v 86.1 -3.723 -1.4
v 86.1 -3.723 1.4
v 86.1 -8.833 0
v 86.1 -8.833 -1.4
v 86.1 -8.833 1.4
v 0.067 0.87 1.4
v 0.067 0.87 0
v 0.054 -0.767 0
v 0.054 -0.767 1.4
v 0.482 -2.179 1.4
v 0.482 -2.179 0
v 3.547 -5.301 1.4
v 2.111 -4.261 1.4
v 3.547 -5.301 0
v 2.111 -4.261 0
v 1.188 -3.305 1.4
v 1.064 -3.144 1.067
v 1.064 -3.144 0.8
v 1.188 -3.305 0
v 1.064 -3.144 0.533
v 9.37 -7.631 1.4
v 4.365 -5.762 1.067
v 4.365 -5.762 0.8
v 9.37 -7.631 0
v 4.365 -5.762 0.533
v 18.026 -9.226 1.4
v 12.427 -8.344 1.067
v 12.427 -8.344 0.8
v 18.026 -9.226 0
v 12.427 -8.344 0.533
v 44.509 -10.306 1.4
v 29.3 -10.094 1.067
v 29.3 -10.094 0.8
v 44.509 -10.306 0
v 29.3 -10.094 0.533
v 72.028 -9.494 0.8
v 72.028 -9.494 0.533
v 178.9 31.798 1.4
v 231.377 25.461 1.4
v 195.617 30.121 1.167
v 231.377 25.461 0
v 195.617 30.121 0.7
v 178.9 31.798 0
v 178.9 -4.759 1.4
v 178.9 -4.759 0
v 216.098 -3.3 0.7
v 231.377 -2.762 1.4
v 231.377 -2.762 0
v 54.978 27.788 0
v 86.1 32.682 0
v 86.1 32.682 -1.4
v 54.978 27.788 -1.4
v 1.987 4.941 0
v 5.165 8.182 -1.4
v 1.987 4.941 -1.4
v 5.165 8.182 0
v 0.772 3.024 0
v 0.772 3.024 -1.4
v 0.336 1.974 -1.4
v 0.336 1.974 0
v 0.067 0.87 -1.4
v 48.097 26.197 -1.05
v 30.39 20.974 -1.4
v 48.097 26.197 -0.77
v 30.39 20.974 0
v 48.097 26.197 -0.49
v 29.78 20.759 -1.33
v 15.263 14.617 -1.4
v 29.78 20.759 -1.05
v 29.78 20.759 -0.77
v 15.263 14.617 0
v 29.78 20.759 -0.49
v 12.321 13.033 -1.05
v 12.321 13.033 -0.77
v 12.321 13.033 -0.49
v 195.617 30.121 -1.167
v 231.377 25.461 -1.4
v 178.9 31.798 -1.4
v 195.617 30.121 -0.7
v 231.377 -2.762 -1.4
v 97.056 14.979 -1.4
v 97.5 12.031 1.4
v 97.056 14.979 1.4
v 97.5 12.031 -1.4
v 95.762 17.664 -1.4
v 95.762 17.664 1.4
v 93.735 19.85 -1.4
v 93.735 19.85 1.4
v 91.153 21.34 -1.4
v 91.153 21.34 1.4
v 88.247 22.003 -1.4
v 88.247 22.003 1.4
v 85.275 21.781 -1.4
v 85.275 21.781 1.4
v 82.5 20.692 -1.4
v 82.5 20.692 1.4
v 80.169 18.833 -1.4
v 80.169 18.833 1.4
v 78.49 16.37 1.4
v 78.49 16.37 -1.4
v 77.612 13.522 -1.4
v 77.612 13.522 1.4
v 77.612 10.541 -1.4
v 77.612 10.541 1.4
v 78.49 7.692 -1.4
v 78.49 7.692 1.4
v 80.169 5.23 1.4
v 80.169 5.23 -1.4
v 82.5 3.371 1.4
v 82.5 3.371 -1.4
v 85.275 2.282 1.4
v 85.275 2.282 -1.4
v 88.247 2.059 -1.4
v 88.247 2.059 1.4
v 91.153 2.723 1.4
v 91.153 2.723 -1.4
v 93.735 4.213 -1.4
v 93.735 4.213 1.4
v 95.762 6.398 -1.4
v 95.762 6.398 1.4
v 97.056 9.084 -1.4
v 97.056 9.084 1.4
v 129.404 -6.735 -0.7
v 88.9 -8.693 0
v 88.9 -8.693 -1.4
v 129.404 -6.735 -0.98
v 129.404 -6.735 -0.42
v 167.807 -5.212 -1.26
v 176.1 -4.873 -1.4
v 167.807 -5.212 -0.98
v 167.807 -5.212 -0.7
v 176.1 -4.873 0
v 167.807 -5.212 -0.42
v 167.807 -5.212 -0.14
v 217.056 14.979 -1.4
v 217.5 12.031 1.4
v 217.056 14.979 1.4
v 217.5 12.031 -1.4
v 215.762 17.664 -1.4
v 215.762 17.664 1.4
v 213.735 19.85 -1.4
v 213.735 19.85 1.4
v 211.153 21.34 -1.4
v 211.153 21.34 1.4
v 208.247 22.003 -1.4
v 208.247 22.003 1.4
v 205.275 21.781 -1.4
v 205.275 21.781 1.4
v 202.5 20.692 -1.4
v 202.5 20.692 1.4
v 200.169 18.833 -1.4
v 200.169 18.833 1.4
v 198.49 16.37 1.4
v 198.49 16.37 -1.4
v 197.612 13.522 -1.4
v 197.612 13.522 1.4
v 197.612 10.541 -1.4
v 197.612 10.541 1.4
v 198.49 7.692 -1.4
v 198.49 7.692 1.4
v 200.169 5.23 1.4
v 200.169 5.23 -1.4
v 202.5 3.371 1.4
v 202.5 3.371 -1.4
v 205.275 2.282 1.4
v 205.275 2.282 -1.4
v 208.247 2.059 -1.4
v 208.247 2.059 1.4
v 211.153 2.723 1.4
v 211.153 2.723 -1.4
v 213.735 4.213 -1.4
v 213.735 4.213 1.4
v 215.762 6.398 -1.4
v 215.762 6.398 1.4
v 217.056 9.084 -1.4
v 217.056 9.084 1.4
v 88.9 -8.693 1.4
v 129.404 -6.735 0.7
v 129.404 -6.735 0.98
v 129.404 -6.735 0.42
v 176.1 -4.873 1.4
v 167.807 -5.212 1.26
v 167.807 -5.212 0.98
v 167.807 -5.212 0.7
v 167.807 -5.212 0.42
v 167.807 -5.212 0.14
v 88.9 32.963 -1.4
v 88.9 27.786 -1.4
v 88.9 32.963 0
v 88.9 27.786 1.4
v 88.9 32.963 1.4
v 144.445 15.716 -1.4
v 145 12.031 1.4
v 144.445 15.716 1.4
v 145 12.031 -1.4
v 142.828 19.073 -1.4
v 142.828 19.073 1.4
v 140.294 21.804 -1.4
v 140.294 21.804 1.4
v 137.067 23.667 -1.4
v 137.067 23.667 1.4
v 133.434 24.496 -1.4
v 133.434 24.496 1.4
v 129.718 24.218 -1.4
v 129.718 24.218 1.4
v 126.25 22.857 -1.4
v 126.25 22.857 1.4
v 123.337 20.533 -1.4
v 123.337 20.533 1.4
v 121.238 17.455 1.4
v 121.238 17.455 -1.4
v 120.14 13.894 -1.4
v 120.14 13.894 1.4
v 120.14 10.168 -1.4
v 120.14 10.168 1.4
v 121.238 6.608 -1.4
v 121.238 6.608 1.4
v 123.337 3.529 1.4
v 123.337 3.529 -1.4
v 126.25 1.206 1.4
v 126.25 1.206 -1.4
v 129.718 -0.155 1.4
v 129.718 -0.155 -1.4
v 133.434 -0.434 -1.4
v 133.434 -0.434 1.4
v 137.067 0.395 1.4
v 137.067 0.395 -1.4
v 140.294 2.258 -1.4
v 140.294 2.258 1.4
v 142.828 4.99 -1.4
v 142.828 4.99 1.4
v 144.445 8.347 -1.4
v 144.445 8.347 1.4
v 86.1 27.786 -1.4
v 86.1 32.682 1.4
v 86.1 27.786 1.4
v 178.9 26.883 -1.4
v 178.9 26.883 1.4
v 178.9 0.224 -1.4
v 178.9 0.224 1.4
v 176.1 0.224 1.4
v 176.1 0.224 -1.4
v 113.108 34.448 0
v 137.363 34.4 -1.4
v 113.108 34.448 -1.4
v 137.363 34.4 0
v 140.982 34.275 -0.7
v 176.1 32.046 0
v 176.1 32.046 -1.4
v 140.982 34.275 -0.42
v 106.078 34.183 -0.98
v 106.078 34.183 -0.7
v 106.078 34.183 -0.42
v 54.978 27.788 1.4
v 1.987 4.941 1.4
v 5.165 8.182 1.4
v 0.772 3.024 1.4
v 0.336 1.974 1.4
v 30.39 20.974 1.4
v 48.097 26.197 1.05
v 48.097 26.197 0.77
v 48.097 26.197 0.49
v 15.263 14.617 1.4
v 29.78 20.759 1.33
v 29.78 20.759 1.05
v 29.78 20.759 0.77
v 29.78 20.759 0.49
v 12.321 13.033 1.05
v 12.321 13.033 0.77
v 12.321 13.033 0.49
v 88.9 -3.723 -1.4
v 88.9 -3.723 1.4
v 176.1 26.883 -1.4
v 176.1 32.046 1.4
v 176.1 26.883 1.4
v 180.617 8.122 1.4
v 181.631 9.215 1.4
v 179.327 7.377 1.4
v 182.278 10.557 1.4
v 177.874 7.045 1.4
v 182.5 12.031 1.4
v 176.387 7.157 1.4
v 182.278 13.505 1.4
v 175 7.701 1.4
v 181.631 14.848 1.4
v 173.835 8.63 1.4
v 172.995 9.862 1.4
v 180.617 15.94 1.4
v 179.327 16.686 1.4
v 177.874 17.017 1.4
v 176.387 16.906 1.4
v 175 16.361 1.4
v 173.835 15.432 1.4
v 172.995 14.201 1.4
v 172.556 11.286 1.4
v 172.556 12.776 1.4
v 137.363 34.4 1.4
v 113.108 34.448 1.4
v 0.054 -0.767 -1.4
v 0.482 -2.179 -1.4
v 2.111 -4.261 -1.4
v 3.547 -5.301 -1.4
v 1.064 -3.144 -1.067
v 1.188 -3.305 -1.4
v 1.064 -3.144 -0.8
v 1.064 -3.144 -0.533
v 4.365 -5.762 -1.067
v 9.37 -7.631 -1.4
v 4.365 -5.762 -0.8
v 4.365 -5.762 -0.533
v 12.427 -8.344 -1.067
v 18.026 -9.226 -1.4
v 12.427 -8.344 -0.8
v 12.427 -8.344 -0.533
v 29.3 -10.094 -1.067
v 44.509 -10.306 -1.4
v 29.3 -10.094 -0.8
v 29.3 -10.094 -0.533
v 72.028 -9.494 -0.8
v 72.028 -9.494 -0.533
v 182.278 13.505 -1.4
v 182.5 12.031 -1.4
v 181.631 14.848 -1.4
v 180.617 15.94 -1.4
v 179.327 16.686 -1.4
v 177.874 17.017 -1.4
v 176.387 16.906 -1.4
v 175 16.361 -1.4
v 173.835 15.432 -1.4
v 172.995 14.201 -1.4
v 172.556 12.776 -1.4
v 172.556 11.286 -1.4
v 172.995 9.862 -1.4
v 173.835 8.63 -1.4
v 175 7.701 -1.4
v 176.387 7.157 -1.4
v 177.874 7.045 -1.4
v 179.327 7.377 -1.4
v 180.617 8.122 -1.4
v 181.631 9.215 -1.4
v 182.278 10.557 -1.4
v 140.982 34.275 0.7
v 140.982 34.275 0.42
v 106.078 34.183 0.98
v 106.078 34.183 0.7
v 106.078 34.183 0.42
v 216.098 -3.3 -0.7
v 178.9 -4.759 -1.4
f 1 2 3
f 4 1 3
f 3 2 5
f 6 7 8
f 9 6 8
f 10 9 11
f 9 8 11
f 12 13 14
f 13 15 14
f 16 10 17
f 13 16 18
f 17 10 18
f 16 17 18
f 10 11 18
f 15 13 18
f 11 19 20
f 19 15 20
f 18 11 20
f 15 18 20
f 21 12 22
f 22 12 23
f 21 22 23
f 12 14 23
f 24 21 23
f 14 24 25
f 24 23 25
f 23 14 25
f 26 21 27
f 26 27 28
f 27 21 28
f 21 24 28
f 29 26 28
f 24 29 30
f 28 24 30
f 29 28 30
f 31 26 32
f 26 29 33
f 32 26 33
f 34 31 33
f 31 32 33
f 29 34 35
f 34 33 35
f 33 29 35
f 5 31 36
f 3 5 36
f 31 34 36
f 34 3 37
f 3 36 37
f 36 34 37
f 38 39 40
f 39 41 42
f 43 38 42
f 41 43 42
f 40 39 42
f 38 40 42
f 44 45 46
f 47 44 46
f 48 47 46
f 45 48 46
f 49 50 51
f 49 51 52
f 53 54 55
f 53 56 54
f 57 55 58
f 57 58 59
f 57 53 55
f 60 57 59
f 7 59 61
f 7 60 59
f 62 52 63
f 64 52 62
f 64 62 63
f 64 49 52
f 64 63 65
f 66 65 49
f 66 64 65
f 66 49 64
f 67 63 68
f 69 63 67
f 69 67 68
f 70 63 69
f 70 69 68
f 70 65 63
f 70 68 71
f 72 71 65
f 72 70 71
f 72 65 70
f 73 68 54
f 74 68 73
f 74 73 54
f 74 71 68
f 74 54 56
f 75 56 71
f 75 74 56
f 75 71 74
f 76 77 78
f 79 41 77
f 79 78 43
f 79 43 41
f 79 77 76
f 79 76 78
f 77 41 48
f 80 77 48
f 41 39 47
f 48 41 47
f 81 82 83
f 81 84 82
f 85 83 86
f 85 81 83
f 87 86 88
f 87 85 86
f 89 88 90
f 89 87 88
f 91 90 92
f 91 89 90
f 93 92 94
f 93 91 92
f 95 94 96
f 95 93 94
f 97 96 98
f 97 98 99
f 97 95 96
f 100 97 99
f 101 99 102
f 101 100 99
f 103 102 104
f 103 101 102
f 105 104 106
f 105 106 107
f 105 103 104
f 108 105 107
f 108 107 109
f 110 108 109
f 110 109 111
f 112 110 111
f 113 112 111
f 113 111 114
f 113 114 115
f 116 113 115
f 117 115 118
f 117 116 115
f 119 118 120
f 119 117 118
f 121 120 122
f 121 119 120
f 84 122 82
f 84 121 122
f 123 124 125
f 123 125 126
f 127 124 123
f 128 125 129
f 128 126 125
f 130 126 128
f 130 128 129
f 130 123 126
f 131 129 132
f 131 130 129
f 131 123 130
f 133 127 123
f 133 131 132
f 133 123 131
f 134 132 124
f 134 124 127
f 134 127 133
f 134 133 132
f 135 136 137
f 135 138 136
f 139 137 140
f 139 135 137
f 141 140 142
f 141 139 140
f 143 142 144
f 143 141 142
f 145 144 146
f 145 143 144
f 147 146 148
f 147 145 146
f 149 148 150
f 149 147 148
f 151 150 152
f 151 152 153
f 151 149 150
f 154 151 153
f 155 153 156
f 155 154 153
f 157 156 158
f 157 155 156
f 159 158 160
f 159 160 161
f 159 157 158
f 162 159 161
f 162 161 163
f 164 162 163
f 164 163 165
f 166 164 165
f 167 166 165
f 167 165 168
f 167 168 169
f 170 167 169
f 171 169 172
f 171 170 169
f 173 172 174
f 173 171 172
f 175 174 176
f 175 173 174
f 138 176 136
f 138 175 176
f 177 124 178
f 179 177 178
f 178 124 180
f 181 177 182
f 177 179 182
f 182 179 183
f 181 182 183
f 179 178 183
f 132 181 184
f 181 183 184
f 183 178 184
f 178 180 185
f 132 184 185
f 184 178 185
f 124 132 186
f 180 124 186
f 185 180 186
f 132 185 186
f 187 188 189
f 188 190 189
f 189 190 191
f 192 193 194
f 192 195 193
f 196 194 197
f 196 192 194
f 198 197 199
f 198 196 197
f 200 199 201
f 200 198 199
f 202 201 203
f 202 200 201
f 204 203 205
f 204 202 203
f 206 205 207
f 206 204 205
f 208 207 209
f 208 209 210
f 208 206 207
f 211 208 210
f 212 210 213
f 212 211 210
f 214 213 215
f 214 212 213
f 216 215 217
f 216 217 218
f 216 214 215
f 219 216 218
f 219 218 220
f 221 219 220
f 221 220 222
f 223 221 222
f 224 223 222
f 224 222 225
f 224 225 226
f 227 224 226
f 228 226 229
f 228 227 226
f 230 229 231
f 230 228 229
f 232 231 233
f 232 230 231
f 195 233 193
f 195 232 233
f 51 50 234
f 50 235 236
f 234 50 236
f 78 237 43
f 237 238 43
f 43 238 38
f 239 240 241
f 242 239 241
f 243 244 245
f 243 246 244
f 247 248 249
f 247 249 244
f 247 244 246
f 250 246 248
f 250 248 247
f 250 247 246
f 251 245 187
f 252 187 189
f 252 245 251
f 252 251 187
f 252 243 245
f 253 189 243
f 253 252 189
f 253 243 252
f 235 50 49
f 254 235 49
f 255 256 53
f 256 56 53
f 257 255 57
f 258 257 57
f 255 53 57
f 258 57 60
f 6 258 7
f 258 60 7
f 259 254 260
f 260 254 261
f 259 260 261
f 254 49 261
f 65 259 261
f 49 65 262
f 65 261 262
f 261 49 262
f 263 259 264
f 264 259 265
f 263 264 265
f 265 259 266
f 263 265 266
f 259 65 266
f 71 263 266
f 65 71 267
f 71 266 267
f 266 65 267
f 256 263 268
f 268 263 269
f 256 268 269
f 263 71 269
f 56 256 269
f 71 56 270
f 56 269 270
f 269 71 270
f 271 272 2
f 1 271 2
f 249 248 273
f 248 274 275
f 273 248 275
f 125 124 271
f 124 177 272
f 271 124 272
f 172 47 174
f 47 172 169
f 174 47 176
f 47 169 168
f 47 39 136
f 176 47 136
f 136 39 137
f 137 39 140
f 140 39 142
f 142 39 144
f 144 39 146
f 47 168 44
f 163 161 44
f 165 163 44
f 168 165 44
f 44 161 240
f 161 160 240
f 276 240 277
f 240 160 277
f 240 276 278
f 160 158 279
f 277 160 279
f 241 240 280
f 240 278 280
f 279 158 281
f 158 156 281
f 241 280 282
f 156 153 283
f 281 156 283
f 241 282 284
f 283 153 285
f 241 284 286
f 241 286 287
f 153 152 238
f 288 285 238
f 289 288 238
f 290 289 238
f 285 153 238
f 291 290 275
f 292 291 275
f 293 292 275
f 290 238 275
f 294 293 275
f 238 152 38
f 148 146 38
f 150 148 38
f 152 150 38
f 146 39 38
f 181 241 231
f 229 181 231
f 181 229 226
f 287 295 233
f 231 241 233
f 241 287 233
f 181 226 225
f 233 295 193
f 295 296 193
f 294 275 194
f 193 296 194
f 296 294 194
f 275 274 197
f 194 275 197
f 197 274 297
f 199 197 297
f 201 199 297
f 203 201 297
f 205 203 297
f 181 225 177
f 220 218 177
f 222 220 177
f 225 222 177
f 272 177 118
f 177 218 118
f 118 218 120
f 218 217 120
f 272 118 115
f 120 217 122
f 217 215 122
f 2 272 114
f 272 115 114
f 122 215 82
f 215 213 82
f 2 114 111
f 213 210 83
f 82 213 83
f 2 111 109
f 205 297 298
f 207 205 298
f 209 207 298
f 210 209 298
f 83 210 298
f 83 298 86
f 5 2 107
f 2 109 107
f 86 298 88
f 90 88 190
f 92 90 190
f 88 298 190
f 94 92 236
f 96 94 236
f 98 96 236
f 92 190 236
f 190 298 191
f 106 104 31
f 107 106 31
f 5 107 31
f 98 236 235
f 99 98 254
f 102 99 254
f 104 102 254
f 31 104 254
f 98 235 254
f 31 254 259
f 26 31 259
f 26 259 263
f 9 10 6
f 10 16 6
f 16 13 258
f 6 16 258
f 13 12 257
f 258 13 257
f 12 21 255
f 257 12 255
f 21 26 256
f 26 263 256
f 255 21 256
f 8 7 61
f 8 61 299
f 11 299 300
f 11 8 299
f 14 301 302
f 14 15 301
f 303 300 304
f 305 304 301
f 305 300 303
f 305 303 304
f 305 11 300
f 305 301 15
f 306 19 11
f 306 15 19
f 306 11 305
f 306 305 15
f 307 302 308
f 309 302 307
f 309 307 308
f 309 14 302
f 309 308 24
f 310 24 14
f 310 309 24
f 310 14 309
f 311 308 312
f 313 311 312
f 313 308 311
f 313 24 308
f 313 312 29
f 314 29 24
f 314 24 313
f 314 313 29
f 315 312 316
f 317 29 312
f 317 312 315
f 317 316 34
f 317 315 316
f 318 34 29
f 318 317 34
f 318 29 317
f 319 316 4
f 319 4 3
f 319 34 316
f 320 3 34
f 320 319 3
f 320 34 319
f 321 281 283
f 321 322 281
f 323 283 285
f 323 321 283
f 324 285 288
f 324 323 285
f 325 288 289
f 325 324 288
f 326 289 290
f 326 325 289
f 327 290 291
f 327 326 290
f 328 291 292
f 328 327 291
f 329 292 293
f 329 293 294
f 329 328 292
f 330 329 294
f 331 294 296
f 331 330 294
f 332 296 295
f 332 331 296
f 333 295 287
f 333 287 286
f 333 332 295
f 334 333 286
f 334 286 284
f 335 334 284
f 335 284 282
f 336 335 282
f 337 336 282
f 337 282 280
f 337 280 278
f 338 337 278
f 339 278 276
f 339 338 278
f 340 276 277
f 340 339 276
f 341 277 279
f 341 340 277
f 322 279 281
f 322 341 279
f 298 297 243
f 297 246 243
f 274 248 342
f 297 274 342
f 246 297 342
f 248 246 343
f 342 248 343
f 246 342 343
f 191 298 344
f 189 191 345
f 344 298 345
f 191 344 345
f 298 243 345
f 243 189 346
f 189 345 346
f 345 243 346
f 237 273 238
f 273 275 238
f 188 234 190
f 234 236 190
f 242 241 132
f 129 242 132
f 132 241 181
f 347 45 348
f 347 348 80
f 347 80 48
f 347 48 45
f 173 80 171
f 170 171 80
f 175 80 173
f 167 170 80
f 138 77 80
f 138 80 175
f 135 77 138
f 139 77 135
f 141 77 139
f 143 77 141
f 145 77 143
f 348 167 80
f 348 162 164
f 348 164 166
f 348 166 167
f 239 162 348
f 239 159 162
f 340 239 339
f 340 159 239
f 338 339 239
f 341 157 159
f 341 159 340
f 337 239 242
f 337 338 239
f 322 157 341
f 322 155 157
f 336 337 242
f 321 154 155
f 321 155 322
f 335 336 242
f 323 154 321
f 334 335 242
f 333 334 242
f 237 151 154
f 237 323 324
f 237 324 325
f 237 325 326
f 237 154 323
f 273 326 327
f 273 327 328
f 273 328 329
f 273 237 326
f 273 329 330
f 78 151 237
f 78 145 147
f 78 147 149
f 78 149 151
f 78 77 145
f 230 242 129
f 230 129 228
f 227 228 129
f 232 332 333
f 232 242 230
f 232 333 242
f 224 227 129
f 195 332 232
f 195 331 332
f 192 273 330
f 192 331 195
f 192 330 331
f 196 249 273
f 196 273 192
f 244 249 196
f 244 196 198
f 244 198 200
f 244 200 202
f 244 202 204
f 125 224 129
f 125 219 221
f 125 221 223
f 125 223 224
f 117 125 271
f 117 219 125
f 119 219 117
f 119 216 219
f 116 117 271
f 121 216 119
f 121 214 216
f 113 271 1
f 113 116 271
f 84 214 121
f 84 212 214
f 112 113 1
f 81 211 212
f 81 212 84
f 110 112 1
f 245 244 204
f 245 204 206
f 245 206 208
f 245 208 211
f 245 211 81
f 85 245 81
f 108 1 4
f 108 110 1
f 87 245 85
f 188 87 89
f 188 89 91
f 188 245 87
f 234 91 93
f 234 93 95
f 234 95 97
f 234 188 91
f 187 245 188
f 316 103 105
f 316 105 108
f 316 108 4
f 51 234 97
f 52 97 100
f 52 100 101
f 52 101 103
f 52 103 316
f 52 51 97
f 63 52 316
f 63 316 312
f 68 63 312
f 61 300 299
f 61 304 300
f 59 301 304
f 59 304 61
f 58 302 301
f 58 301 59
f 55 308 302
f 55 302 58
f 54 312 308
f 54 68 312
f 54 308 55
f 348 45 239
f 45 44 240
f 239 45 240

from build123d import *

# Parameters (mm, degrees)
SKETCH_2_R      = 10
SKETCH_2_R_2    = 5
SKETCH_2_R_3    = 12.5
EXTRUDE_1_DEPTH = 1.4


with BuildPart() as part:
    # Эскиз2 → Бобышка-Вытянуть1 (new body, symmetric)
    with BuildSketch(Plane.XY):
        with BuildLine():
            Line((86.1, 32.682283633), (86.1, 27.785621096))
            Line((86.1, 27.785621096), (88.9, 27.785621096))
            Line((88.9, 27.785621096), (88.9, 32.962973681))
            add(Edge.make_bspline(
                [(176.1, 32.045532515), (173.460642448, 32.274383054), (167.786299659, 32.738244602), (159.079993996, 33.354548335), (150.013824851, 33.880339702), (141.037533969, 34.297759375), (132.176453799, 34.561309726), (123.418285188, 34.636133951), (114.728660276, 34.522388831), (106.092728827, 34.217419352), (97.485414888, 33.712894632), (91.763569037, 33.237837821), (88.9, 32.962973681)],
                knots=[0.48932836, 0.48932836, 0.48932836, 0.48932836, 0.51130307, 0.536551515, 0.561723366, 0.586628867, 0.611085431, 0.6352512, 0.659272176, 0.683163753, 0.706922144, 0.730783121, 0.730783121, 0.730783121, 0.730783121], degree=3))
            Line((176.1, 32.045532515), (176.1, 26.882916451))
            Line((176.1, 26.882916451), (178.9, 26.882916451))
            Line((178.9, 26.882916451), (178.9, 31.797856127))
            add(Edge.make_bspline(
                [(231.376774993, 25.460683081), (228.623090859, 25.872976705), (222.81618615, 26.717098435), (213.950527179, 27.922839845), (204.785615162, 29.076995056), (195.623903708, 30.135946559), (186.99647265, 31.041402296), (181.421156727, 31.570451189), (178.9, 31.797856127)],
                knots=[0.335389042, 0.335389042, 0.335389042, 0.335389042, 0.358484538, 0.384061186, 0.409602822, 0.435103874, 0.460559416, 0.481556447, 0.481556447, 0.481556447, 0.481556447], degree=3))
            Line((231.376774993, 25.460683081), (231.376774993, -2.762108733))
            add(Edge.make_bspline(
                [(178.9, -4.758637273), (181.652979317, -4.646278606), (187.626173611, -4.403273739), (196.81461857, -4.035333009), (206.460819266, -3.659492142), (216.093643375, -3.297876981), (224.397462902, -3.000330699), (229.490633691, -2.825658562), (231.376774993, -2.762108733)],
                knots=[0.517634386, 0.517634386, 0.517634386, 0.517634386, 0.540928595, 0.568176028, 0.595379569, 0.622543445, 0.64967326, 0.665628529, 0.665628529, 0.665628529, 0.665628529], degree=3))
            Line((178.9, -4.758637273), (178.9, 0.224194977))
            Line((178.9, 0.224194977), (176.1, 0.224194977))
            Line((176.1, 0.224194977), (176.1, -4.873020948))
            add(Edge.make_bspline(
                [(88.9, -8.693267562), (89.617844041, -8.657365264), (93.544099689, -8.4603043), (100.675081793, -8.097607246), (110.279925807, -7.615552634), (119.854698054, -7.155331752), (129.404950626, -6.726934654), (138.957043666, -6.344774315), (148.536329767, -5.989584537), (158.156896352, -5.604325894), (167.348797605, -5.231176131), (173.335752744, -4.986028102), (176.1, -4.873020948)],
                knots=[0.263757046, 0.263757046, 0.263757046, 0.263757046, 0.269833583, 0.296993022, 0.324123272, 0.351139107, 0.378035509, 0.404946016, 0.431960837, 0.459078395, 0.4863474, 0.509737017, 0.509737017, 0.509737017, 0.509737017], degree=3))
            Line((88.9, -8.693267562), (88.9, -3.723116029))
            Line((88.9, -3.723116029), (86.1, -3.723116029))
            Line((86.1, -3.723116029), (86.1, -8.832579685))
            add(Edge.make_bspline(
                [(0.067165, 0.869995), (0.031799348, 0.52288612), (-0.038949105, -0.171499965), (0.109187697, -1.238208426), (0.489573911, -2.294373299), (1.140063589, -3.311096493), (2.048873093, -4.254985343), (3.207362223, -5.125399257), (4.62830025, -5.930091469), (6.349357867, -6.683143801), (8.441643964, -7.39506903), (11.016573701, -8.071443347), (14.236363949, -8.71040323), (18.305613464, -9.295466224), (23.419361508, -9.790139433), (29.665932935, -10.146283203), (36.959978182, -10.327294388), (45.07635799, -10.326759678), (53.756929463, -10.166011212), (62.800670475, -9.879297901), (72.081160335, -9.501034945), (79.871929674, -9.138172062), (84.562006059, -8.908655535), (86.1, -8.832579685)],
                knots=[0, 0, 0, 0, 0.002941446, 0.005884319, 0.00901613, 0.012364547, 0.016007934, 0.020036845, 0.024573728, 0.029783835, 0.03589701, 0.04324044, 0.052275965, 0.063634589, 0.077983176, 0.095698161, 0.116520086, 0.13966073, 0.16431217, 0.18991889, 0.216157201, 0.242837762, 0.255856498, 0.255856498, 0.255856498, 0.255856498], degree=3))
            add(Edge.make_bspline(
                [(86.1, 32.682283633), (84.251034658, 32.488999326), (79.618112888, 31.965003077), (72.248067764, 30.96669173), (64.042160436, 29.619190205), (55.994200632, 28.049519945), (48.157087779, 26.258842728), (40.614534945, 24.258661851), (33.496117772, 22.08061089), (26.978950376, 19.787977208), (21.250737748, 17.476669613), (16.436666106, 15.253855393), (12.543120617, 13.201408311), (9.465247652, 11.352044479), (7.047193647, 9.694493277), (5.140372907, 8.19592153), (3.628941572, 6.819827516), (2.433445936, 5.533634041), (1.497819162, 4.313324923), (0.800303575, 3.138270943), (0.302083458, 2.003099556), (0.143157814, 1.236538372), (0.067165, 0.869995)],
                knots=[0.738563451, 0.738563451, 0.738563451, 0.738563451, 0.7539832, 0.77723469, 0.800246382, 0.822950709, 0.845237155, 0.866915896, 0.887662335, 0.906968281, 0.924203157, 0.938878975, 0.950931611, 0.960693484, 0.968646729, 0.975232933, 0.980794744, 0.985583761, 0.989781539, 0.993521313, 0.996902113, 1, 1, 1, 1], degree=3))
        make_face()
        with Locations((87.5, 12.031252534)):
            Circle(SKETCH_2_R, mode=Mode.SUBTRACT)
        with Locations((177.5, 12.031252534)):
            Circle(SKETCH_2_R_2, mode=Mode.SUBTRACT)
        with Locations((132.5, 12.031252534)):
            Circle(SKETCH_2_R_3, mode=Mode.SUBTRACT)
        with Locations((207.5, 12.031252534)):
            Circle(SKETCH_2_R, mode=Mode.SUBTRACT)
    extrude(amount=EXTRUDE_1_DEPTH, both=True)


solid = part.part
